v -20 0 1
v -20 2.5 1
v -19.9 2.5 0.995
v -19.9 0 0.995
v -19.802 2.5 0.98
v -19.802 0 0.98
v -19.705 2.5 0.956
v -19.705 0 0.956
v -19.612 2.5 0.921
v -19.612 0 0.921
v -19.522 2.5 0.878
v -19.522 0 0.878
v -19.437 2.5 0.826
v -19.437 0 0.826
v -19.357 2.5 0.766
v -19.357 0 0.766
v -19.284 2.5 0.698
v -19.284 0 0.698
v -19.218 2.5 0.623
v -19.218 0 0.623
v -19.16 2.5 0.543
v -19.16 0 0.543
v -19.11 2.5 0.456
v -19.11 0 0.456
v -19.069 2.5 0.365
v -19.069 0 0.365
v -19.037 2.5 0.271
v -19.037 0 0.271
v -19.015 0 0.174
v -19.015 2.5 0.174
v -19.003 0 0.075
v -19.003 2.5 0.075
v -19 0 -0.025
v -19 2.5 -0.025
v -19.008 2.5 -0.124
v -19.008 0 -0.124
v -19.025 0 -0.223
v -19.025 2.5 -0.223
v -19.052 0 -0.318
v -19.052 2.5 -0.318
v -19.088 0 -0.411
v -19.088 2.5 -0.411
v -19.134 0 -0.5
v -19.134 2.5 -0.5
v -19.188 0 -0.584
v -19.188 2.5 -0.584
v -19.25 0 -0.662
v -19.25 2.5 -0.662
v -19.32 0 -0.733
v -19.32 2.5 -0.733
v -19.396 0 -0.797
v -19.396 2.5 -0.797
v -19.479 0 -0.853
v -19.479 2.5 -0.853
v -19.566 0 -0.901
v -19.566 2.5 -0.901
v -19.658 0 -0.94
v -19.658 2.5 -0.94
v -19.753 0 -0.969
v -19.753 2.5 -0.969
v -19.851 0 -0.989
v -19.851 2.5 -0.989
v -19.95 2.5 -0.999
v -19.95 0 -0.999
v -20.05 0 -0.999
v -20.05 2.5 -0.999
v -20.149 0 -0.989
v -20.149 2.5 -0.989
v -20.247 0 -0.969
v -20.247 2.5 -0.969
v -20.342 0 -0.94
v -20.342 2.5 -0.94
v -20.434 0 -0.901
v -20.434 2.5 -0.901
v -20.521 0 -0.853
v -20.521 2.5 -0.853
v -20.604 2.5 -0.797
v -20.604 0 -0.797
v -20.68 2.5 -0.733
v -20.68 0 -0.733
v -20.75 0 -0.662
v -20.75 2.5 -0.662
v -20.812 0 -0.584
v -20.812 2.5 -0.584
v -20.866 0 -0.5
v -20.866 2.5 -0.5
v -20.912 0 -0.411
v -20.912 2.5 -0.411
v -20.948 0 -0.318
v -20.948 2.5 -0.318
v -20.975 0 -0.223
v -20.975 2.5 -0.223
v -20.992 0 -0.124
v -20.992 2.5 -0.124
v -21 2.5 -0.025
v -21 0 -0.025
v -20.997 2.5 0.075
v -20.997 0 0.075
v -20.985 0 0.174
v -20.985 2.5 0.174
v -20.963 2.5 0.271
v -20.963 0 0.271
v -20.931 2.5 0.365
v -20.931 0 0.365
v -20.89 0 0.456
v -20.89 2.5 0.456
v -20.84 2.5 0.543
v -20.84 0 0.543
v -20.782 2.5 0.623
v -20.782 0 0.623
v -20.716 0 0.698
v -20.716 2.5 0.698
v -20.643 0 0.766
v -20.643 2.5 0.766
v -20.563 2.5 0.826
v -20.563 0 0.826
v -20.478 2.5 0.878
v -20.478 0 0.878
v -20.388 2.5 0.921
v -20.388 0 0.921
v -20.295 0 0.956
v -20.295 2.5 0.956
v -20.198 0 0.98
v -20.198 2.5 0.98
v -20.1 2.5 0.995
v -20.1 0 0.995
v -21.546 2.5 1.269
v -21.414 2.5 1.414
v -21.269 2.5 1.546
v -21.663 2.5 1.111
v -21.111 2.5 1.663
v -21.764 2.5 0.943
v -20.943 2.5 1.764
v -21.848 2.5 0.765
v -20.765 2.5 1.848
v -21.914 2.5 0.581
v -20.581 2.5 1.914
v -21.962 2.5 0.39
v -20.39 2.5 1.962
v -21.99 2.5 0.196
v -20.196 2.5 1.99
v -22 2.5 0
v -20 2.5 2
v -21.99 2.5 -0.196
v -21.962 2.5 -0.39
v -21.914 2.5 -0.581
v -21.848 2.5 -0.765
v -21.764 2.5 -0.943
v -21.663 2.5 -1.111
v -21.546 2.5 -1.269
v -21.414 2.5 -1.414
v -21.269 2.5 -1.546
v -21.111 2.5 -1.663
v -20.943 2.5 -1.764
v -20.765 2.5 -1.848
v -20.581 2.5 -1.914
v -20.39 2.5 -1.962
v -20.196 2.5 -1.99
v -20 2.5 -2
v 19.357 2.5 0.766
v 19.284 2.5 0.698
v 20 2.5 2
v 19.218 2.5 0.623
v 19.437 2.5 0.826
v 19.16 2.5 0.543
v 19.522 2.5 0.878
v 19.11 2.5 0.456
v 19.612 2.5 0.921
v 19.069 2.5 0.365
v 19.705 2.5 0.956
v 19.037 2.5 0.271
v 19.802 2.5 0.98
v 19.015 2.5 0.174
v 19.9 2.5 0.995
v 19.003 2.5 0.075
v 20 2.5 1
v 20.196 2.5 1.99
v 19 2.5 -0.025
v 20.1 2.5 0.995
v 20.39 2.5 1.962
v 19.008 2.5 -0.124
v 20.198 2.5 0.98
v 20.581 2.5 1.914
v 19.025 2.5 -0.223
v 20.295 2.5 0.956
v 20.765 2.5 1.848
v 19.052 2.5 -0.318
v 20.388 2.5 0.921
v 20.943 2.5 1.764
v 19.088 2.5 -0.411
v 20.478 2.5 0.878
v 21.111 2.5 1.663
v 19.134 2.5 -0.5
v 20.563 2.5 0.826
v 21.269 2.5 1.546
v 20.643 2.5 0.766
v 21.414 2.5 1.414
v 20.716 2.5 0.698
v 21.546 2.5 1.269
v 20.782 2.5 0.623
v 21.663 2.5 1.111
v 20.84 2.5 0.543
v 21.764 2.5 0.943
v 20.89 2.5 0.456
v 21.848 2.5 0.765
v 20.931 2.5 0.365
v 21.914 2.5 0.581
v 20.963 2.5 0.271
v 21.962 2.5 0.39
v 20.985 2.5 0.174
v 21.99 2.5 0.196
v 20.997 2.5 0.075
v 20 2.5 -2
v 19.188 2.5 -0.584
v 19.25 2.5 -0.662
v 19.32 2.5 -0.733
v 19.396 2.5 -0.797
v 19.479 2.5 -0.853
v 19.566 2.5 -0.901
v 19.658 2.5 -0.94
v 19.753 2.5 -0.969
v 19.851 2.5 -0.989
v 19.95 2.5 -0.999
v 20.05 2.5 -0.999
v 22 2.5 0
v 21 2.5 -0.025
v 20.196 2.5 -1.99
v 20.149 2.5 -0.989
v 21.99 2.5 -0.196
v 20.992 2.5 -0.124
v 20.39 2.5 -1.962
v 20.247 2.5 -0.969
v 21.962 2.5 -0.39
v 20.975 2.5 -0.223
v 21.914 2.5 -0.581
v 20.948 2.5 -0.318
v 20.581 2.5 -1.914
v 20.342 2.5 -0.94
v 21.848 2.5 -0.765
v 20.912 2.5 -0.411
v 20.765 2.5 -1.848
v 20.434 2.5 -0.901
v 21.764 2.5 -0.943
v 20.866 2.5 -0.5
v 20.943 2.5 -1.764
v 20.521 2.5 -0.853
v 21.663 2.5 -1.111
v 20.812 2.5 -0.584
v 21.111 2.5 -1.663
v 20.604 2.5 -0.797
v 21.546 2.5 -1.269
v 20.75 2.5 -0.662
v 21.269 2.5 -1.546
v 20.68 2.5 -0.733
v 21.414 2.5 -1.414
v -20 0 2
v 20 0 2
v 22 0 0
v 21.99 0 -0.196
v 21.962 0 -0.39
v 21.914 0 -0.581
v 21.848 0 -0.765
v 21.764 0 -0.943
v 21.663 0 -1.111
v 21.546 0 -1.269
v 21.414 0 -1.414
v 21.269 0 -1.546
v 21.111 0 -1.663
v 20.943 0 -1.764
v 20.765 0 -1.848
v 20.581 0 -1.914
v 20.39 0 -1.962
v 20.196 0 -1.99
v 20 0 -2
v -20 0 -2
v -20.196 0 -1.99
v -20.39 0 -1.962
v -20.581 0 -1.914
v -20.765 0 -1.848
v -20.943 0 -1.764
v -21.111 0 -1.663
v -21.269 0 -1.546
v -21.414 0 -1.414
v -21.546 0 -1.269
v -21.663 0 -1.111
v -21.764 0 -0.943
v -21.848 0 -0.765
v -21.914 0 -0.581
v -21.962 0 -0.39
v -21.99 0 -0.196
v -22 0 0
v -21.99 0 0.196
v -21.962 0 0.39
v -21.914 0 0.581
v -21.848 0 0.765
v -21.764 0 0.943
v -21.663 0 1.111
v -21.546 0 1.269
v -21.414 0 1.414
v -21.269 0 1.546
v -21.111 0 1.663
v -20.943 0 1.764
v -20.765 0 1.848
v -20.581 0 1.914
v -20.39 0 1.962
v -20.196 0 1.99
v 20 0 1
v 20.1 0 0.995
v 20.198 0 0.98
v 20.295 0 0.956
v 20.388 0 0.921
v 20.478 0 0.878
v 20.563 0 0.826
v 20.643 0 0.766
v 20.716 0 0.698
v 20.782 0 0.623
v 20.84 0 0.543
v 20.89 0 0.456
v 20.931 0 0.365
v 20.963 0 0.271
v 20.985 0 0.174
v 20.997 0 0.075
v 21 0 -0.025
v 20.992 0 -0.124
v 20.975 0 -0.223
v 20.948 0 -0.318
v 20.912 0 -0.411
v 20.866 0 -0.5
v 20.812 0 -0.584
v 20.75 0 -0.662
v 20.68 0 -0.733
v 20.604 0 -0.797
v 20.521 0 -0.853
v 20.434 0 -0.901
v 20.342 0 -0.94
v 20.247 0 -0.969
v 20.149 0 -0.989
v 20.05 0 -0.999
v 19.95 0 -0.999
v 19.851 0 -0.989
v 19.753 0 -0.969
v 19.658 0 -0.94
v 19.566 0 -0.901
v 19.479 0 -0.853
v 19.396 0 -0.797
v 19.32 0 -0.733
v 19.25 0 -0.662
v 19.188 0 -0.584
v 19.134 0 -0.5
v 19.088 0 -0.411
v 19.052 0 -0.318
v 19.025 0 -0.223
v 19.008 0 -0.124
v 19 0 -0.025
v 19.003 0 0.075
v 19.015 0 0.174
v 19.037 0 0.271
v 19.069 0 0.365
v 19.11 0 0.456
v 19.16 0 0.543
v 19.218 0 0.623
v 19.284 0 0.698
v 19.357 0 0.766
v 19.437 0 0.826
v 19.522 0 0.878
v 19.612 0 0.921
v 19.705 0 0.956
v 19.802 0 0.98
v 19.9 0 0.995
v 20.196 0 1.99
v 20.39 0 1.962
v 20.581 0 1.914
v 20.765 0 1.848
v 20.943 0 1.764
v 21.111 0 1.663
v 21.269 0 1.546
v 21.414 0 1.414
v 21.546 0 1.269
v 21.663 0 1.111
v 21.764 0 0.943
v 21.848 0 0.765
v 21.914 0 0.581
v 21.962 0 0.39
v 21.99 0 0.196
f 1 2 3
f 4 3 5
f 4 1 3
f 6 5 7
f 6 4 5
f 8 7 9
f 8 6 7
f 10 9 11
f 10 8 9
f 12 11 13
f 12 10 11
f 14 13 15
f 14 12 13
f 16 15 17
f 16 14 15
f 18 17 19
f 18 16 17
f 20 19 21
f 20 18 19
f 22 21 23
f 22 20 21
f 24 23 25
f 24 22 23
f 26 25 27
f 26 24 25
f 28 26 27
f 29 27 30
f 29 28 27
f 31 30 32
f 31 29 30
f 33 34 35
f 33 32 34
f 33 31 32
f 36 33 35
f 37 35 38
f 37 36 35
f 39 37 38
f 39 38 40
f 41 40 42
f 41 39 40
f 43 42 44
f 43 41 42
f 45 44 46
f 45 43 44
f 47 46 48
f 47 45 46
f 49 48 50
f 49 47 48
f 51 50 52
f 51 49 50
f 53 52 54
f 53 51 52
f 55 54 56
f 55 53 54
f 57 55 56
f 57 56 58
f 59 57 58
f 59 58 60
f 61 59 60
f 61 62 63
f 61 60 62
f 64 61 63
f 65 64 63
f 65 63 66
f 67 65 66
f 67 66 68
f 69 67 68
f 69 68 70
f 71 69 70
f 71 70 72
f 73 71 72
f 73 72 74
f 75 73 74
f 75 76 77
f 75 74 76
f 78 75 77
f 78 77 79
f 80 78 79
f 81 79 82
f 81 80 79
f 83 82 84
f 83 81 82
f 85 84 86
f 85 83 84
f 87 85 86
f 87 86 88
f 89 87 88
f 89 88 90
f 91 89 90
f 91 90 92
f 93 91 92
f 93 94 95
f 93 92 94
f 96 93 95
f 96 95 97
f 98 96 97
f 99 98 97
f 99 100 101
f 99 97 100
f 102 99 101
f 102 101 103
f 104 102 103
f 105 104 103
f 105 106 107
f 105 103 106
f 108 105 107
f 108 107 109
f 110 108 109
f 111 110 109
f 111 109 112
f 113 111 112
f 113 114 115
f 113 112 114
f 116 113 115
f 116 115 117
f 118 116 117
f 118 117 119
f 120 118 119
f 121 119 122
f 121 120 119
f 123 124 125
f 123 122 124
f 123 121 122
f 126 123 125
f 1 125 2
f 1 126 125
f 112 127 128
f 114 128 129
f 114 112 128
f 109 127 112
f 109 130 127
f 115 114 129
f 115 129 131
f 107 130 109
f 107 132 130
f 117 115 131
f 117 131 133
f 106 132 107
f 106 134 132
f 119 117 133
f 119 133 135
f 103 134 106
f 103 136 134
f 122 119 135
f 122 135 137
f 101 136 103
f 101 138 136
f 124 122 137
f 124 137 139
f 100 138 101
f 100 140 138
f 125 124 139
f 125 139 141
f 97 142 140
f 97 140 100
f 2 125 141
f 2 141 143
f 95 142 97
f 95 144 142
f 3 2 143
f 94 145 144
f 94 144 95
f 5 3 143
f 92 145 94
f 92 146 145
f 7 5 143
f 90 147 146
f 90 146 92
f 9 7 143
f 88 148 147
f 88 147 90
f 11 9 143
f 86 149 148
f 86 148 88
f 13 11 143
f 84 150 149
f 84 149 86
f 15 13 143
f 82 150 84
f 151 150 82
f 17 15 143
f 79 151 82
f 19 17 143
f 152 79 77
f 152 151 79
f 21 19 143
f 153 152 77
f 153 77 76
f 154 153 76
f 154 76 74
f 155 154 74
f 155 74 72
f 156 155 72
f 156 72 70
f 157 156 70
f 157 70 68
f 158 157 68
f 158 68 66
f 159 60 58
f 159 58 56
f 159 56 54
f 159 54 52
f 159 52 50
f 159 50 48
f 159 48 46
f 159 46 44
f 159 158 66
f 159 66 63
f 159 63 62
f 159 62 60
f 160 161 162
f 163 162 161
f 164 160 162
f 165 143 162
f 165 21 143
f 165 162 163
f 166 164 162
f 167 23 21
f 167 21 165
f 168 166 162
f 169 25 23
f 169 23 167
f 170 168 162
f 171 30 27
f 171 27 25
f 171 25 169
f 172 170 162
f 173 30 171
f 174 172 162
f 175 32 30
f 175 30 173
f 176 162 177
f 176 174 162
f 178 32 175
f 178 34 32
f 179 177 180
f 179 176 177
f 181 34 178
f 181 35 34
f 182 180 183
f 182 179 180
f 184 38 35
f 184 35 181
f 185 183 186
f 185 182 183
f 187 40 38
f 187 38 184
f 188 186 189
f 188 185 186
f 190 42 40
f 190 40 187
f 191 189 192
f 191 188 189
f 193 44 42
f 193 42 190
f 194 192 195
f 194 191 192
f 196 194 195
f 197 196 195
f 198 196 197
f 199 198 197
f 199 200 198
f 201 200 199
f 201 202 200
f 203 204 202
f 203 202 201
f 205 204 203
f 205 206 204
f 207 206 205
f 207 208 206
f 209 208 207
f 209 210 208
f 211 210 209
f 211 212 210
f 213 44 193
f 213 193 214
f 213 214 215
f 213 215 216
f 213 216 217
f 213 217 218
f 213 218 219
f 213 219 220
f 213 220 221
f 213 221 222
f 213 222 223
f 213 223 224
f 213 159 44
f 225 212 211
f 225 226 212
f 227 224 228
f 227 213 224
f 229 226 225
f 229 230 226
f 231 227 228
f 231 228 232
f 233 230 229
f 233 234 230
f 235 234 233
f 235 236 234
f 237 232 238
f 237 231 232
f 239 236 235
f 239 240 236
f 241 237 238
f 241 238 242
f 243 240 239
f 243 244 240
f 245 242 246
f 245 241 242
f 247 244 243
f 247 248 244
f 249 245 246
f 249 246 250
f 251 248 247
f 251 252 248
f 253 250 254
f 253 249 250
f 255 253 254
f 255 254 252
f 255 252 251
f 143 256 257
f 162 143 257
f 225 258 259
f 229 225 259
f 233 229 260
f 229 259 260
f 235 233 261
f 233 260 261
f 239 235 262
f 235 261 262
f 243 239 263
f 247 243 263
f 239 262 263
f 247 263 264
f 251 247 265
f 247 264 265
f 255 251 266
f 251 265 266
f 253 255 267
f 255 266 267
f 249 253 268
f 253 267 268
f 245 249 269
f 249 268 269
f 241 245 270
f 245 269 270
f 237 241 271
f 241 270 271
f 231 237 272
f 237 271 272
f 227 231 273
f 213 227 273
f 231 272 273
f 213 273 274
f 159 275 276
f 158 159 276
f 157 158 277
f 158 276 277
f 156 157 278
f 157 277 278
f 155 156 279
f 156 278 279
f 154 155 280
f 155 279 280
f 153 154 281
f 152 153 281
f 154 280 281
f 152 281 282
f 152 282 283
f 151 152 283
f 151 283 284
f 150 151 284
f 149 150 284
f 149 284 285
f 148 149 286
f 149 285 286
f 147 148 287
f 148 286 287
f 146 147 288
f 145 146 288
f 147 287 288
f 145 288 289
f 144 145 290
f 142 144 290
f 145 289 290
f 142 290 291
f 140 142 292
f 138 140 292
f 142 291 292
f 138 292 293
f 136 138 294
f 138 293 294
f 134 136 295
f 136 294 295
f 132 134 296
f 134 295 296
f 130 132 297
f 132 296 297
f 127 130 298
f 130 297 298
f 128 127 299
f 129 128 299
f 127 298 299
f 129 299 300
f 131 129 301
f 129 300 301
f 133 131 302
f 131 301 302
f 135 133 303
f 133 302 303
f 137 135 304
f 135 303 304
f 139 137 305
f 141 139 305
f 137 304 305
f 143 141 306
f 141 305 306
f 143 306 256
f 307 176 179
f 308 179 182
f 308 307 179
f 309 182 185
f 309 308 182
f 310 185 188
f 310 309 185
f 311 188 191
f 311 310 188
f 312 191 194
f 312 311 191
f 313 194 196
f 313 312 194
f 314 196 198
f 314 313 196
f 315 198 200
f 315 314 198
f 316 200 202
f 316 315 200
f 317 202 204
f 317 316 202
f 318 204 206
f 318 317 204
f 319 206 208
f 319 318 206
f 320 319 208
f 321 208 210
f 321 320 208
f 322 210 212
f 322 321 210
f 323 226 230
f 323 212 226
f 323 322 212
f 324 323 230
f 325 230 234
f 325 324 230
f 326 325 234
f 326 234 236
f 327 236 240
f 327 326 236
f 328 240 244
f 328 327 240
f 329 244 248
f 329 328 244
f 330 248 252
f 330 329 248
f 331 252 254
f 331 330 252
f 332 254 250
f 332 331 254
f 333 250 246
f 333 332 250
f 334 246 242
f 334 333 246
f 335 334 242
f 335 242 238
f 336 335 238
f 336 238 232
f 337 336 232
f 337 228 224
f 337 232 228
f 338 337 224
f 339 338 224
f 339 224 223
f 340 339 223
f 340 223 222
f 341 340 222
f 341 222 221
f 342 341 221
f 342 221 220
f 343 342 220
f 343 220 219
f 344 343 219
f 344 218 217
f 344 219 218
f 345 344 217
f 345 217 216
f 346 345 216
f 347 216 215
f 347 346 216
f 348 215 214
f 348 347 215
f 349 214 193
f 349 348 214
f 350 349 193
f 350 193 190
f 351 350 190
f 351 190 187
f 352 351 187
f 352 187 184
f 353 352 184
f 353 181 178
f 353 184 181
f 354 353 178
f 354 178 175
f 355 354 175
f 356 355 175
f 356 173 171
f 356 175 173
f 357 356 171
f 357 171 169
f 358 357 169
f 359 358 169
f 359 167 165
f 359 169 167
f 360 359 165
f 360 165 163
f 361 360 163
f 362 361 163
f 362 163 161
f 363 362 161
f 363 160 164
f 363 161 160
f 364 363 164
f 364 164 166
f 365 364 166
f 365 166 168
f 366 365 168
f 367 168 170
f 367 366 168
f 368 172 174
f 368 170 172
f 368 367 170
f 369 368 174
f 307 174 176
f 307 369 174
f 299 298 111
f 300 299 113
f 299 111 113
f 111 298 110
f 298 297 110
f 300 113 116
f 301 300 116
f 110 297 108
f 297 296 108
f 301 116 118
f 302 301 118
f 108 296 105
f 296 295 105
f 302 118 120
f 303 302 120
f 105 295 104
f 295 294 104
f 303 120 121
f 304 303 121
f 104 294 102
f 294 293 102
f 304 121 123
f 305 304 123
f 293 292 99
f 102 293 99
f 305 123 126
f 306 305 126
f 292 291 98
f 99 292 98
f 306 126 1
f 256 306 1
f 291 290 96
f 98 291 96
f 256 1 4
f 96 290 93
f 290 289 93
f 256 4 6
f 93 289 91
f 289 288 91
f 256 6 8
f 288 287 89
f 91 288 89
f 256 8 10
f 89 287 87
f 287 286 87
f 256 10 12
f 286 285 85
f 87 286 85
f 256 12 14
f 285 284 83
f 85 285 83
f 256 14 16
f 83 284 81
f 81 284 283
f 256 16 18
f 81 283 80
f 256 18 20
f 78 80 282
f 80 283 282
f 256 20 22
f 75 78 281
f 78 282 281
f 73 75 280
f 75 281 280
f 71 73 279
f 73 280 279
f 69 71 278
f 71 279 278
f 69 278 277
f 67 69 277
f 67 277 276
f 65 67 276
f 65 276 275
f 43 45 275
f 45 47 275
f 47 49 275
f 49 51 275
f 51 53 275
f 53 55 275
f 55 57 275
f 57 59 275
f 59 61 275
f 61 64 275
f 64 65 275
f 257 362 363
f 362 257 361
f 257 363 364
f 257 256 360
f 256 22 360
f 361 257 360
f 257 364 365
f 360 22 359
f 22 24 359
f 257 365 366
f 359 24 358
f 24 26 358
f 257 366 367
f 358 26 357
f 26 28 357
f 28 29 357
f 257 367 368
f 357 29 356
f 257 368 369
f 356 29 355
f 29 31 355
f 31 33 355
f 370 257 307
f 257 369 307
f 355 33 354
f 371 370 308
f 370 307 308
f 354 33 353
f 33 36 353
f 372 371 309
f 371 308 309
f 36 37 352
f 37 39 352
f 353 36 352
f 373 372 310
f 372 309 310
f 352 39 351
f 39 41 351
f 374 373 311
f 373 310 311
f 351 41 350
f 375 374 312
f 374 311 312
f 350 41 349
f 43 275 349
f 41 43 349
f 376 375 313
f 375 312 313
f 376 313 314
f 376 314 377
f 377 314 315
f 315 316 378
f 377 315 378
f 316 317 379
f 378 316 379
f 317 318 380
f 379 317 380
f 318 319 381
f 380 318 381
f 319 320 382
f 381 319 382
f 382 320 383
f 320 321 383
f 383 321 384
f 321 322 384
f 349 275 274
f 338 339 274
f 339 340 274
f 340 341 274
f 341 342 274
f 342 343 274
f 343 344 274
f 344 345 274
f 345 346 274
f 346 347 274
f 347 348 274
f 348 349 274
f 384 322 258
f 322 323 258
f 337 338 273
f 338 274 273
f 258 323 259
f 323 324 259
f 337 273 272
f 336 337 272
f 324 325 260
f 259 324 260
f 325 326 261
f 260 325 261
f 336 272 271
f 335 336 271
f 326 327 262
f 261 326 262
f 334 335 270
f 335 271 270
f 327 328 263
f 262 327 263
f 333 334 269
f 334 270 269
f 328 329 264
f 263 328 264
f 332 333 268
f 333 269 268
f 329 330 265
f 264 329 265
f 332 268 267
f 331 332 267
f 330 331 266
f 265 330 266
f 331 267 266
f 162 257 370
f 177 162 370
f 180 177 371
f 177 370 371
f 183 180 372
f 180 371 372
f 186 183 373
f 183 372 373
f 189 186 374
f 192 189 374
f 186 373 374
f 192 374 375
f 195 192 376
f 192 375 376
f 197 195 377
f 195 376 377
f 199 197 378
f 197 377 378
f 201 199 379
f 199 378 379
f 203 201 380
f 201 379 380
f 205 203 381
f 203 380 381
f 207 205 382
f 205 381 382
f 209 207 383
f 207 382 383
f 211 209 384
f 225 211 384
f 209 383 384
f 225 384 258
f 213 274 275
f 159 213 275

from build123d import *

# Parameters (mm, degrees)
BOSS_EXTRUDE1_DEPTH = 2.5
SKETCH2_R           = 1
CUT_EXTRUDE1_DEPTH  = 23.231734075


with BuildPart() as part:
    # Sketch1 → Boss-Extrude1 (new body)
    with BuildSketch(Plane(origin=(0, 0, 0), x_dir=(1, 0, 0), z_dir=(0, 1, 0))):
        with BuildLine():
            ThreePointArc((-20, 2), (-22, 0), (-20, -2))
            Line((-20, -2), (-20, 2))
        make_face()
        with BuildLine():
            Line((-20, 2), (-20, -2))
            ThreePointArc((-20, -2), (-18.585786438, -1.414213562), (-18, 0))
            ThreePointArc((-18, 0), (-18.585786438, 1.414213562), (-20, 2))
        make_face()
        with BuildLine():
            ThreePointArc((-18, 0), (-18.585786438, -1.414213562), (-20, -2))
            Line((-20, -2), (20, -2))
            ThreePointArc((20, -2), (18, 0), (20, 2))
            Line((20, 2), (-20, 2))
            ThreePointArc((-20, 2), (-18.585786438, 1.414213562), (-18, 0))
        make_face()
        with BuildLine():
            ThreePointArc((20, 2), (18, 0), (20, -2))
            Line((20, -2), (20, 2))
        make_face()
        with BuildLine():
            Line((20, 2), (20, -2))
            ThreePointArc((20, -2), (21.414213562, -1.414213562), (22, 0))
            ThreePointArc((22, 0), (21.414213562, 1.414213562), (20, 2))
        make_face()
    extrude(amount=BOSS_EXTRUDE1_DEPTH)

    # Sketch2 → Cut-Extrude1 (cut, through all)
    with BuildSketch(Plane(origin=(0, 0, 0), x_dir=(1, 0, 0), z_dir=(0, 1, 0))):
        with Locations(Location((20, 0, 0), (0, 0, 270))):
            Circle(SKETCH2_R)
        with Locations(Location((-20, 0, 0), (0, 0, 270))):
            Circle(SKETCH2_R)
    extrude(amount=CUT_EXTRUDE1_DEPTH, mode=Mode.SUBTRACT)


solid = part.part
